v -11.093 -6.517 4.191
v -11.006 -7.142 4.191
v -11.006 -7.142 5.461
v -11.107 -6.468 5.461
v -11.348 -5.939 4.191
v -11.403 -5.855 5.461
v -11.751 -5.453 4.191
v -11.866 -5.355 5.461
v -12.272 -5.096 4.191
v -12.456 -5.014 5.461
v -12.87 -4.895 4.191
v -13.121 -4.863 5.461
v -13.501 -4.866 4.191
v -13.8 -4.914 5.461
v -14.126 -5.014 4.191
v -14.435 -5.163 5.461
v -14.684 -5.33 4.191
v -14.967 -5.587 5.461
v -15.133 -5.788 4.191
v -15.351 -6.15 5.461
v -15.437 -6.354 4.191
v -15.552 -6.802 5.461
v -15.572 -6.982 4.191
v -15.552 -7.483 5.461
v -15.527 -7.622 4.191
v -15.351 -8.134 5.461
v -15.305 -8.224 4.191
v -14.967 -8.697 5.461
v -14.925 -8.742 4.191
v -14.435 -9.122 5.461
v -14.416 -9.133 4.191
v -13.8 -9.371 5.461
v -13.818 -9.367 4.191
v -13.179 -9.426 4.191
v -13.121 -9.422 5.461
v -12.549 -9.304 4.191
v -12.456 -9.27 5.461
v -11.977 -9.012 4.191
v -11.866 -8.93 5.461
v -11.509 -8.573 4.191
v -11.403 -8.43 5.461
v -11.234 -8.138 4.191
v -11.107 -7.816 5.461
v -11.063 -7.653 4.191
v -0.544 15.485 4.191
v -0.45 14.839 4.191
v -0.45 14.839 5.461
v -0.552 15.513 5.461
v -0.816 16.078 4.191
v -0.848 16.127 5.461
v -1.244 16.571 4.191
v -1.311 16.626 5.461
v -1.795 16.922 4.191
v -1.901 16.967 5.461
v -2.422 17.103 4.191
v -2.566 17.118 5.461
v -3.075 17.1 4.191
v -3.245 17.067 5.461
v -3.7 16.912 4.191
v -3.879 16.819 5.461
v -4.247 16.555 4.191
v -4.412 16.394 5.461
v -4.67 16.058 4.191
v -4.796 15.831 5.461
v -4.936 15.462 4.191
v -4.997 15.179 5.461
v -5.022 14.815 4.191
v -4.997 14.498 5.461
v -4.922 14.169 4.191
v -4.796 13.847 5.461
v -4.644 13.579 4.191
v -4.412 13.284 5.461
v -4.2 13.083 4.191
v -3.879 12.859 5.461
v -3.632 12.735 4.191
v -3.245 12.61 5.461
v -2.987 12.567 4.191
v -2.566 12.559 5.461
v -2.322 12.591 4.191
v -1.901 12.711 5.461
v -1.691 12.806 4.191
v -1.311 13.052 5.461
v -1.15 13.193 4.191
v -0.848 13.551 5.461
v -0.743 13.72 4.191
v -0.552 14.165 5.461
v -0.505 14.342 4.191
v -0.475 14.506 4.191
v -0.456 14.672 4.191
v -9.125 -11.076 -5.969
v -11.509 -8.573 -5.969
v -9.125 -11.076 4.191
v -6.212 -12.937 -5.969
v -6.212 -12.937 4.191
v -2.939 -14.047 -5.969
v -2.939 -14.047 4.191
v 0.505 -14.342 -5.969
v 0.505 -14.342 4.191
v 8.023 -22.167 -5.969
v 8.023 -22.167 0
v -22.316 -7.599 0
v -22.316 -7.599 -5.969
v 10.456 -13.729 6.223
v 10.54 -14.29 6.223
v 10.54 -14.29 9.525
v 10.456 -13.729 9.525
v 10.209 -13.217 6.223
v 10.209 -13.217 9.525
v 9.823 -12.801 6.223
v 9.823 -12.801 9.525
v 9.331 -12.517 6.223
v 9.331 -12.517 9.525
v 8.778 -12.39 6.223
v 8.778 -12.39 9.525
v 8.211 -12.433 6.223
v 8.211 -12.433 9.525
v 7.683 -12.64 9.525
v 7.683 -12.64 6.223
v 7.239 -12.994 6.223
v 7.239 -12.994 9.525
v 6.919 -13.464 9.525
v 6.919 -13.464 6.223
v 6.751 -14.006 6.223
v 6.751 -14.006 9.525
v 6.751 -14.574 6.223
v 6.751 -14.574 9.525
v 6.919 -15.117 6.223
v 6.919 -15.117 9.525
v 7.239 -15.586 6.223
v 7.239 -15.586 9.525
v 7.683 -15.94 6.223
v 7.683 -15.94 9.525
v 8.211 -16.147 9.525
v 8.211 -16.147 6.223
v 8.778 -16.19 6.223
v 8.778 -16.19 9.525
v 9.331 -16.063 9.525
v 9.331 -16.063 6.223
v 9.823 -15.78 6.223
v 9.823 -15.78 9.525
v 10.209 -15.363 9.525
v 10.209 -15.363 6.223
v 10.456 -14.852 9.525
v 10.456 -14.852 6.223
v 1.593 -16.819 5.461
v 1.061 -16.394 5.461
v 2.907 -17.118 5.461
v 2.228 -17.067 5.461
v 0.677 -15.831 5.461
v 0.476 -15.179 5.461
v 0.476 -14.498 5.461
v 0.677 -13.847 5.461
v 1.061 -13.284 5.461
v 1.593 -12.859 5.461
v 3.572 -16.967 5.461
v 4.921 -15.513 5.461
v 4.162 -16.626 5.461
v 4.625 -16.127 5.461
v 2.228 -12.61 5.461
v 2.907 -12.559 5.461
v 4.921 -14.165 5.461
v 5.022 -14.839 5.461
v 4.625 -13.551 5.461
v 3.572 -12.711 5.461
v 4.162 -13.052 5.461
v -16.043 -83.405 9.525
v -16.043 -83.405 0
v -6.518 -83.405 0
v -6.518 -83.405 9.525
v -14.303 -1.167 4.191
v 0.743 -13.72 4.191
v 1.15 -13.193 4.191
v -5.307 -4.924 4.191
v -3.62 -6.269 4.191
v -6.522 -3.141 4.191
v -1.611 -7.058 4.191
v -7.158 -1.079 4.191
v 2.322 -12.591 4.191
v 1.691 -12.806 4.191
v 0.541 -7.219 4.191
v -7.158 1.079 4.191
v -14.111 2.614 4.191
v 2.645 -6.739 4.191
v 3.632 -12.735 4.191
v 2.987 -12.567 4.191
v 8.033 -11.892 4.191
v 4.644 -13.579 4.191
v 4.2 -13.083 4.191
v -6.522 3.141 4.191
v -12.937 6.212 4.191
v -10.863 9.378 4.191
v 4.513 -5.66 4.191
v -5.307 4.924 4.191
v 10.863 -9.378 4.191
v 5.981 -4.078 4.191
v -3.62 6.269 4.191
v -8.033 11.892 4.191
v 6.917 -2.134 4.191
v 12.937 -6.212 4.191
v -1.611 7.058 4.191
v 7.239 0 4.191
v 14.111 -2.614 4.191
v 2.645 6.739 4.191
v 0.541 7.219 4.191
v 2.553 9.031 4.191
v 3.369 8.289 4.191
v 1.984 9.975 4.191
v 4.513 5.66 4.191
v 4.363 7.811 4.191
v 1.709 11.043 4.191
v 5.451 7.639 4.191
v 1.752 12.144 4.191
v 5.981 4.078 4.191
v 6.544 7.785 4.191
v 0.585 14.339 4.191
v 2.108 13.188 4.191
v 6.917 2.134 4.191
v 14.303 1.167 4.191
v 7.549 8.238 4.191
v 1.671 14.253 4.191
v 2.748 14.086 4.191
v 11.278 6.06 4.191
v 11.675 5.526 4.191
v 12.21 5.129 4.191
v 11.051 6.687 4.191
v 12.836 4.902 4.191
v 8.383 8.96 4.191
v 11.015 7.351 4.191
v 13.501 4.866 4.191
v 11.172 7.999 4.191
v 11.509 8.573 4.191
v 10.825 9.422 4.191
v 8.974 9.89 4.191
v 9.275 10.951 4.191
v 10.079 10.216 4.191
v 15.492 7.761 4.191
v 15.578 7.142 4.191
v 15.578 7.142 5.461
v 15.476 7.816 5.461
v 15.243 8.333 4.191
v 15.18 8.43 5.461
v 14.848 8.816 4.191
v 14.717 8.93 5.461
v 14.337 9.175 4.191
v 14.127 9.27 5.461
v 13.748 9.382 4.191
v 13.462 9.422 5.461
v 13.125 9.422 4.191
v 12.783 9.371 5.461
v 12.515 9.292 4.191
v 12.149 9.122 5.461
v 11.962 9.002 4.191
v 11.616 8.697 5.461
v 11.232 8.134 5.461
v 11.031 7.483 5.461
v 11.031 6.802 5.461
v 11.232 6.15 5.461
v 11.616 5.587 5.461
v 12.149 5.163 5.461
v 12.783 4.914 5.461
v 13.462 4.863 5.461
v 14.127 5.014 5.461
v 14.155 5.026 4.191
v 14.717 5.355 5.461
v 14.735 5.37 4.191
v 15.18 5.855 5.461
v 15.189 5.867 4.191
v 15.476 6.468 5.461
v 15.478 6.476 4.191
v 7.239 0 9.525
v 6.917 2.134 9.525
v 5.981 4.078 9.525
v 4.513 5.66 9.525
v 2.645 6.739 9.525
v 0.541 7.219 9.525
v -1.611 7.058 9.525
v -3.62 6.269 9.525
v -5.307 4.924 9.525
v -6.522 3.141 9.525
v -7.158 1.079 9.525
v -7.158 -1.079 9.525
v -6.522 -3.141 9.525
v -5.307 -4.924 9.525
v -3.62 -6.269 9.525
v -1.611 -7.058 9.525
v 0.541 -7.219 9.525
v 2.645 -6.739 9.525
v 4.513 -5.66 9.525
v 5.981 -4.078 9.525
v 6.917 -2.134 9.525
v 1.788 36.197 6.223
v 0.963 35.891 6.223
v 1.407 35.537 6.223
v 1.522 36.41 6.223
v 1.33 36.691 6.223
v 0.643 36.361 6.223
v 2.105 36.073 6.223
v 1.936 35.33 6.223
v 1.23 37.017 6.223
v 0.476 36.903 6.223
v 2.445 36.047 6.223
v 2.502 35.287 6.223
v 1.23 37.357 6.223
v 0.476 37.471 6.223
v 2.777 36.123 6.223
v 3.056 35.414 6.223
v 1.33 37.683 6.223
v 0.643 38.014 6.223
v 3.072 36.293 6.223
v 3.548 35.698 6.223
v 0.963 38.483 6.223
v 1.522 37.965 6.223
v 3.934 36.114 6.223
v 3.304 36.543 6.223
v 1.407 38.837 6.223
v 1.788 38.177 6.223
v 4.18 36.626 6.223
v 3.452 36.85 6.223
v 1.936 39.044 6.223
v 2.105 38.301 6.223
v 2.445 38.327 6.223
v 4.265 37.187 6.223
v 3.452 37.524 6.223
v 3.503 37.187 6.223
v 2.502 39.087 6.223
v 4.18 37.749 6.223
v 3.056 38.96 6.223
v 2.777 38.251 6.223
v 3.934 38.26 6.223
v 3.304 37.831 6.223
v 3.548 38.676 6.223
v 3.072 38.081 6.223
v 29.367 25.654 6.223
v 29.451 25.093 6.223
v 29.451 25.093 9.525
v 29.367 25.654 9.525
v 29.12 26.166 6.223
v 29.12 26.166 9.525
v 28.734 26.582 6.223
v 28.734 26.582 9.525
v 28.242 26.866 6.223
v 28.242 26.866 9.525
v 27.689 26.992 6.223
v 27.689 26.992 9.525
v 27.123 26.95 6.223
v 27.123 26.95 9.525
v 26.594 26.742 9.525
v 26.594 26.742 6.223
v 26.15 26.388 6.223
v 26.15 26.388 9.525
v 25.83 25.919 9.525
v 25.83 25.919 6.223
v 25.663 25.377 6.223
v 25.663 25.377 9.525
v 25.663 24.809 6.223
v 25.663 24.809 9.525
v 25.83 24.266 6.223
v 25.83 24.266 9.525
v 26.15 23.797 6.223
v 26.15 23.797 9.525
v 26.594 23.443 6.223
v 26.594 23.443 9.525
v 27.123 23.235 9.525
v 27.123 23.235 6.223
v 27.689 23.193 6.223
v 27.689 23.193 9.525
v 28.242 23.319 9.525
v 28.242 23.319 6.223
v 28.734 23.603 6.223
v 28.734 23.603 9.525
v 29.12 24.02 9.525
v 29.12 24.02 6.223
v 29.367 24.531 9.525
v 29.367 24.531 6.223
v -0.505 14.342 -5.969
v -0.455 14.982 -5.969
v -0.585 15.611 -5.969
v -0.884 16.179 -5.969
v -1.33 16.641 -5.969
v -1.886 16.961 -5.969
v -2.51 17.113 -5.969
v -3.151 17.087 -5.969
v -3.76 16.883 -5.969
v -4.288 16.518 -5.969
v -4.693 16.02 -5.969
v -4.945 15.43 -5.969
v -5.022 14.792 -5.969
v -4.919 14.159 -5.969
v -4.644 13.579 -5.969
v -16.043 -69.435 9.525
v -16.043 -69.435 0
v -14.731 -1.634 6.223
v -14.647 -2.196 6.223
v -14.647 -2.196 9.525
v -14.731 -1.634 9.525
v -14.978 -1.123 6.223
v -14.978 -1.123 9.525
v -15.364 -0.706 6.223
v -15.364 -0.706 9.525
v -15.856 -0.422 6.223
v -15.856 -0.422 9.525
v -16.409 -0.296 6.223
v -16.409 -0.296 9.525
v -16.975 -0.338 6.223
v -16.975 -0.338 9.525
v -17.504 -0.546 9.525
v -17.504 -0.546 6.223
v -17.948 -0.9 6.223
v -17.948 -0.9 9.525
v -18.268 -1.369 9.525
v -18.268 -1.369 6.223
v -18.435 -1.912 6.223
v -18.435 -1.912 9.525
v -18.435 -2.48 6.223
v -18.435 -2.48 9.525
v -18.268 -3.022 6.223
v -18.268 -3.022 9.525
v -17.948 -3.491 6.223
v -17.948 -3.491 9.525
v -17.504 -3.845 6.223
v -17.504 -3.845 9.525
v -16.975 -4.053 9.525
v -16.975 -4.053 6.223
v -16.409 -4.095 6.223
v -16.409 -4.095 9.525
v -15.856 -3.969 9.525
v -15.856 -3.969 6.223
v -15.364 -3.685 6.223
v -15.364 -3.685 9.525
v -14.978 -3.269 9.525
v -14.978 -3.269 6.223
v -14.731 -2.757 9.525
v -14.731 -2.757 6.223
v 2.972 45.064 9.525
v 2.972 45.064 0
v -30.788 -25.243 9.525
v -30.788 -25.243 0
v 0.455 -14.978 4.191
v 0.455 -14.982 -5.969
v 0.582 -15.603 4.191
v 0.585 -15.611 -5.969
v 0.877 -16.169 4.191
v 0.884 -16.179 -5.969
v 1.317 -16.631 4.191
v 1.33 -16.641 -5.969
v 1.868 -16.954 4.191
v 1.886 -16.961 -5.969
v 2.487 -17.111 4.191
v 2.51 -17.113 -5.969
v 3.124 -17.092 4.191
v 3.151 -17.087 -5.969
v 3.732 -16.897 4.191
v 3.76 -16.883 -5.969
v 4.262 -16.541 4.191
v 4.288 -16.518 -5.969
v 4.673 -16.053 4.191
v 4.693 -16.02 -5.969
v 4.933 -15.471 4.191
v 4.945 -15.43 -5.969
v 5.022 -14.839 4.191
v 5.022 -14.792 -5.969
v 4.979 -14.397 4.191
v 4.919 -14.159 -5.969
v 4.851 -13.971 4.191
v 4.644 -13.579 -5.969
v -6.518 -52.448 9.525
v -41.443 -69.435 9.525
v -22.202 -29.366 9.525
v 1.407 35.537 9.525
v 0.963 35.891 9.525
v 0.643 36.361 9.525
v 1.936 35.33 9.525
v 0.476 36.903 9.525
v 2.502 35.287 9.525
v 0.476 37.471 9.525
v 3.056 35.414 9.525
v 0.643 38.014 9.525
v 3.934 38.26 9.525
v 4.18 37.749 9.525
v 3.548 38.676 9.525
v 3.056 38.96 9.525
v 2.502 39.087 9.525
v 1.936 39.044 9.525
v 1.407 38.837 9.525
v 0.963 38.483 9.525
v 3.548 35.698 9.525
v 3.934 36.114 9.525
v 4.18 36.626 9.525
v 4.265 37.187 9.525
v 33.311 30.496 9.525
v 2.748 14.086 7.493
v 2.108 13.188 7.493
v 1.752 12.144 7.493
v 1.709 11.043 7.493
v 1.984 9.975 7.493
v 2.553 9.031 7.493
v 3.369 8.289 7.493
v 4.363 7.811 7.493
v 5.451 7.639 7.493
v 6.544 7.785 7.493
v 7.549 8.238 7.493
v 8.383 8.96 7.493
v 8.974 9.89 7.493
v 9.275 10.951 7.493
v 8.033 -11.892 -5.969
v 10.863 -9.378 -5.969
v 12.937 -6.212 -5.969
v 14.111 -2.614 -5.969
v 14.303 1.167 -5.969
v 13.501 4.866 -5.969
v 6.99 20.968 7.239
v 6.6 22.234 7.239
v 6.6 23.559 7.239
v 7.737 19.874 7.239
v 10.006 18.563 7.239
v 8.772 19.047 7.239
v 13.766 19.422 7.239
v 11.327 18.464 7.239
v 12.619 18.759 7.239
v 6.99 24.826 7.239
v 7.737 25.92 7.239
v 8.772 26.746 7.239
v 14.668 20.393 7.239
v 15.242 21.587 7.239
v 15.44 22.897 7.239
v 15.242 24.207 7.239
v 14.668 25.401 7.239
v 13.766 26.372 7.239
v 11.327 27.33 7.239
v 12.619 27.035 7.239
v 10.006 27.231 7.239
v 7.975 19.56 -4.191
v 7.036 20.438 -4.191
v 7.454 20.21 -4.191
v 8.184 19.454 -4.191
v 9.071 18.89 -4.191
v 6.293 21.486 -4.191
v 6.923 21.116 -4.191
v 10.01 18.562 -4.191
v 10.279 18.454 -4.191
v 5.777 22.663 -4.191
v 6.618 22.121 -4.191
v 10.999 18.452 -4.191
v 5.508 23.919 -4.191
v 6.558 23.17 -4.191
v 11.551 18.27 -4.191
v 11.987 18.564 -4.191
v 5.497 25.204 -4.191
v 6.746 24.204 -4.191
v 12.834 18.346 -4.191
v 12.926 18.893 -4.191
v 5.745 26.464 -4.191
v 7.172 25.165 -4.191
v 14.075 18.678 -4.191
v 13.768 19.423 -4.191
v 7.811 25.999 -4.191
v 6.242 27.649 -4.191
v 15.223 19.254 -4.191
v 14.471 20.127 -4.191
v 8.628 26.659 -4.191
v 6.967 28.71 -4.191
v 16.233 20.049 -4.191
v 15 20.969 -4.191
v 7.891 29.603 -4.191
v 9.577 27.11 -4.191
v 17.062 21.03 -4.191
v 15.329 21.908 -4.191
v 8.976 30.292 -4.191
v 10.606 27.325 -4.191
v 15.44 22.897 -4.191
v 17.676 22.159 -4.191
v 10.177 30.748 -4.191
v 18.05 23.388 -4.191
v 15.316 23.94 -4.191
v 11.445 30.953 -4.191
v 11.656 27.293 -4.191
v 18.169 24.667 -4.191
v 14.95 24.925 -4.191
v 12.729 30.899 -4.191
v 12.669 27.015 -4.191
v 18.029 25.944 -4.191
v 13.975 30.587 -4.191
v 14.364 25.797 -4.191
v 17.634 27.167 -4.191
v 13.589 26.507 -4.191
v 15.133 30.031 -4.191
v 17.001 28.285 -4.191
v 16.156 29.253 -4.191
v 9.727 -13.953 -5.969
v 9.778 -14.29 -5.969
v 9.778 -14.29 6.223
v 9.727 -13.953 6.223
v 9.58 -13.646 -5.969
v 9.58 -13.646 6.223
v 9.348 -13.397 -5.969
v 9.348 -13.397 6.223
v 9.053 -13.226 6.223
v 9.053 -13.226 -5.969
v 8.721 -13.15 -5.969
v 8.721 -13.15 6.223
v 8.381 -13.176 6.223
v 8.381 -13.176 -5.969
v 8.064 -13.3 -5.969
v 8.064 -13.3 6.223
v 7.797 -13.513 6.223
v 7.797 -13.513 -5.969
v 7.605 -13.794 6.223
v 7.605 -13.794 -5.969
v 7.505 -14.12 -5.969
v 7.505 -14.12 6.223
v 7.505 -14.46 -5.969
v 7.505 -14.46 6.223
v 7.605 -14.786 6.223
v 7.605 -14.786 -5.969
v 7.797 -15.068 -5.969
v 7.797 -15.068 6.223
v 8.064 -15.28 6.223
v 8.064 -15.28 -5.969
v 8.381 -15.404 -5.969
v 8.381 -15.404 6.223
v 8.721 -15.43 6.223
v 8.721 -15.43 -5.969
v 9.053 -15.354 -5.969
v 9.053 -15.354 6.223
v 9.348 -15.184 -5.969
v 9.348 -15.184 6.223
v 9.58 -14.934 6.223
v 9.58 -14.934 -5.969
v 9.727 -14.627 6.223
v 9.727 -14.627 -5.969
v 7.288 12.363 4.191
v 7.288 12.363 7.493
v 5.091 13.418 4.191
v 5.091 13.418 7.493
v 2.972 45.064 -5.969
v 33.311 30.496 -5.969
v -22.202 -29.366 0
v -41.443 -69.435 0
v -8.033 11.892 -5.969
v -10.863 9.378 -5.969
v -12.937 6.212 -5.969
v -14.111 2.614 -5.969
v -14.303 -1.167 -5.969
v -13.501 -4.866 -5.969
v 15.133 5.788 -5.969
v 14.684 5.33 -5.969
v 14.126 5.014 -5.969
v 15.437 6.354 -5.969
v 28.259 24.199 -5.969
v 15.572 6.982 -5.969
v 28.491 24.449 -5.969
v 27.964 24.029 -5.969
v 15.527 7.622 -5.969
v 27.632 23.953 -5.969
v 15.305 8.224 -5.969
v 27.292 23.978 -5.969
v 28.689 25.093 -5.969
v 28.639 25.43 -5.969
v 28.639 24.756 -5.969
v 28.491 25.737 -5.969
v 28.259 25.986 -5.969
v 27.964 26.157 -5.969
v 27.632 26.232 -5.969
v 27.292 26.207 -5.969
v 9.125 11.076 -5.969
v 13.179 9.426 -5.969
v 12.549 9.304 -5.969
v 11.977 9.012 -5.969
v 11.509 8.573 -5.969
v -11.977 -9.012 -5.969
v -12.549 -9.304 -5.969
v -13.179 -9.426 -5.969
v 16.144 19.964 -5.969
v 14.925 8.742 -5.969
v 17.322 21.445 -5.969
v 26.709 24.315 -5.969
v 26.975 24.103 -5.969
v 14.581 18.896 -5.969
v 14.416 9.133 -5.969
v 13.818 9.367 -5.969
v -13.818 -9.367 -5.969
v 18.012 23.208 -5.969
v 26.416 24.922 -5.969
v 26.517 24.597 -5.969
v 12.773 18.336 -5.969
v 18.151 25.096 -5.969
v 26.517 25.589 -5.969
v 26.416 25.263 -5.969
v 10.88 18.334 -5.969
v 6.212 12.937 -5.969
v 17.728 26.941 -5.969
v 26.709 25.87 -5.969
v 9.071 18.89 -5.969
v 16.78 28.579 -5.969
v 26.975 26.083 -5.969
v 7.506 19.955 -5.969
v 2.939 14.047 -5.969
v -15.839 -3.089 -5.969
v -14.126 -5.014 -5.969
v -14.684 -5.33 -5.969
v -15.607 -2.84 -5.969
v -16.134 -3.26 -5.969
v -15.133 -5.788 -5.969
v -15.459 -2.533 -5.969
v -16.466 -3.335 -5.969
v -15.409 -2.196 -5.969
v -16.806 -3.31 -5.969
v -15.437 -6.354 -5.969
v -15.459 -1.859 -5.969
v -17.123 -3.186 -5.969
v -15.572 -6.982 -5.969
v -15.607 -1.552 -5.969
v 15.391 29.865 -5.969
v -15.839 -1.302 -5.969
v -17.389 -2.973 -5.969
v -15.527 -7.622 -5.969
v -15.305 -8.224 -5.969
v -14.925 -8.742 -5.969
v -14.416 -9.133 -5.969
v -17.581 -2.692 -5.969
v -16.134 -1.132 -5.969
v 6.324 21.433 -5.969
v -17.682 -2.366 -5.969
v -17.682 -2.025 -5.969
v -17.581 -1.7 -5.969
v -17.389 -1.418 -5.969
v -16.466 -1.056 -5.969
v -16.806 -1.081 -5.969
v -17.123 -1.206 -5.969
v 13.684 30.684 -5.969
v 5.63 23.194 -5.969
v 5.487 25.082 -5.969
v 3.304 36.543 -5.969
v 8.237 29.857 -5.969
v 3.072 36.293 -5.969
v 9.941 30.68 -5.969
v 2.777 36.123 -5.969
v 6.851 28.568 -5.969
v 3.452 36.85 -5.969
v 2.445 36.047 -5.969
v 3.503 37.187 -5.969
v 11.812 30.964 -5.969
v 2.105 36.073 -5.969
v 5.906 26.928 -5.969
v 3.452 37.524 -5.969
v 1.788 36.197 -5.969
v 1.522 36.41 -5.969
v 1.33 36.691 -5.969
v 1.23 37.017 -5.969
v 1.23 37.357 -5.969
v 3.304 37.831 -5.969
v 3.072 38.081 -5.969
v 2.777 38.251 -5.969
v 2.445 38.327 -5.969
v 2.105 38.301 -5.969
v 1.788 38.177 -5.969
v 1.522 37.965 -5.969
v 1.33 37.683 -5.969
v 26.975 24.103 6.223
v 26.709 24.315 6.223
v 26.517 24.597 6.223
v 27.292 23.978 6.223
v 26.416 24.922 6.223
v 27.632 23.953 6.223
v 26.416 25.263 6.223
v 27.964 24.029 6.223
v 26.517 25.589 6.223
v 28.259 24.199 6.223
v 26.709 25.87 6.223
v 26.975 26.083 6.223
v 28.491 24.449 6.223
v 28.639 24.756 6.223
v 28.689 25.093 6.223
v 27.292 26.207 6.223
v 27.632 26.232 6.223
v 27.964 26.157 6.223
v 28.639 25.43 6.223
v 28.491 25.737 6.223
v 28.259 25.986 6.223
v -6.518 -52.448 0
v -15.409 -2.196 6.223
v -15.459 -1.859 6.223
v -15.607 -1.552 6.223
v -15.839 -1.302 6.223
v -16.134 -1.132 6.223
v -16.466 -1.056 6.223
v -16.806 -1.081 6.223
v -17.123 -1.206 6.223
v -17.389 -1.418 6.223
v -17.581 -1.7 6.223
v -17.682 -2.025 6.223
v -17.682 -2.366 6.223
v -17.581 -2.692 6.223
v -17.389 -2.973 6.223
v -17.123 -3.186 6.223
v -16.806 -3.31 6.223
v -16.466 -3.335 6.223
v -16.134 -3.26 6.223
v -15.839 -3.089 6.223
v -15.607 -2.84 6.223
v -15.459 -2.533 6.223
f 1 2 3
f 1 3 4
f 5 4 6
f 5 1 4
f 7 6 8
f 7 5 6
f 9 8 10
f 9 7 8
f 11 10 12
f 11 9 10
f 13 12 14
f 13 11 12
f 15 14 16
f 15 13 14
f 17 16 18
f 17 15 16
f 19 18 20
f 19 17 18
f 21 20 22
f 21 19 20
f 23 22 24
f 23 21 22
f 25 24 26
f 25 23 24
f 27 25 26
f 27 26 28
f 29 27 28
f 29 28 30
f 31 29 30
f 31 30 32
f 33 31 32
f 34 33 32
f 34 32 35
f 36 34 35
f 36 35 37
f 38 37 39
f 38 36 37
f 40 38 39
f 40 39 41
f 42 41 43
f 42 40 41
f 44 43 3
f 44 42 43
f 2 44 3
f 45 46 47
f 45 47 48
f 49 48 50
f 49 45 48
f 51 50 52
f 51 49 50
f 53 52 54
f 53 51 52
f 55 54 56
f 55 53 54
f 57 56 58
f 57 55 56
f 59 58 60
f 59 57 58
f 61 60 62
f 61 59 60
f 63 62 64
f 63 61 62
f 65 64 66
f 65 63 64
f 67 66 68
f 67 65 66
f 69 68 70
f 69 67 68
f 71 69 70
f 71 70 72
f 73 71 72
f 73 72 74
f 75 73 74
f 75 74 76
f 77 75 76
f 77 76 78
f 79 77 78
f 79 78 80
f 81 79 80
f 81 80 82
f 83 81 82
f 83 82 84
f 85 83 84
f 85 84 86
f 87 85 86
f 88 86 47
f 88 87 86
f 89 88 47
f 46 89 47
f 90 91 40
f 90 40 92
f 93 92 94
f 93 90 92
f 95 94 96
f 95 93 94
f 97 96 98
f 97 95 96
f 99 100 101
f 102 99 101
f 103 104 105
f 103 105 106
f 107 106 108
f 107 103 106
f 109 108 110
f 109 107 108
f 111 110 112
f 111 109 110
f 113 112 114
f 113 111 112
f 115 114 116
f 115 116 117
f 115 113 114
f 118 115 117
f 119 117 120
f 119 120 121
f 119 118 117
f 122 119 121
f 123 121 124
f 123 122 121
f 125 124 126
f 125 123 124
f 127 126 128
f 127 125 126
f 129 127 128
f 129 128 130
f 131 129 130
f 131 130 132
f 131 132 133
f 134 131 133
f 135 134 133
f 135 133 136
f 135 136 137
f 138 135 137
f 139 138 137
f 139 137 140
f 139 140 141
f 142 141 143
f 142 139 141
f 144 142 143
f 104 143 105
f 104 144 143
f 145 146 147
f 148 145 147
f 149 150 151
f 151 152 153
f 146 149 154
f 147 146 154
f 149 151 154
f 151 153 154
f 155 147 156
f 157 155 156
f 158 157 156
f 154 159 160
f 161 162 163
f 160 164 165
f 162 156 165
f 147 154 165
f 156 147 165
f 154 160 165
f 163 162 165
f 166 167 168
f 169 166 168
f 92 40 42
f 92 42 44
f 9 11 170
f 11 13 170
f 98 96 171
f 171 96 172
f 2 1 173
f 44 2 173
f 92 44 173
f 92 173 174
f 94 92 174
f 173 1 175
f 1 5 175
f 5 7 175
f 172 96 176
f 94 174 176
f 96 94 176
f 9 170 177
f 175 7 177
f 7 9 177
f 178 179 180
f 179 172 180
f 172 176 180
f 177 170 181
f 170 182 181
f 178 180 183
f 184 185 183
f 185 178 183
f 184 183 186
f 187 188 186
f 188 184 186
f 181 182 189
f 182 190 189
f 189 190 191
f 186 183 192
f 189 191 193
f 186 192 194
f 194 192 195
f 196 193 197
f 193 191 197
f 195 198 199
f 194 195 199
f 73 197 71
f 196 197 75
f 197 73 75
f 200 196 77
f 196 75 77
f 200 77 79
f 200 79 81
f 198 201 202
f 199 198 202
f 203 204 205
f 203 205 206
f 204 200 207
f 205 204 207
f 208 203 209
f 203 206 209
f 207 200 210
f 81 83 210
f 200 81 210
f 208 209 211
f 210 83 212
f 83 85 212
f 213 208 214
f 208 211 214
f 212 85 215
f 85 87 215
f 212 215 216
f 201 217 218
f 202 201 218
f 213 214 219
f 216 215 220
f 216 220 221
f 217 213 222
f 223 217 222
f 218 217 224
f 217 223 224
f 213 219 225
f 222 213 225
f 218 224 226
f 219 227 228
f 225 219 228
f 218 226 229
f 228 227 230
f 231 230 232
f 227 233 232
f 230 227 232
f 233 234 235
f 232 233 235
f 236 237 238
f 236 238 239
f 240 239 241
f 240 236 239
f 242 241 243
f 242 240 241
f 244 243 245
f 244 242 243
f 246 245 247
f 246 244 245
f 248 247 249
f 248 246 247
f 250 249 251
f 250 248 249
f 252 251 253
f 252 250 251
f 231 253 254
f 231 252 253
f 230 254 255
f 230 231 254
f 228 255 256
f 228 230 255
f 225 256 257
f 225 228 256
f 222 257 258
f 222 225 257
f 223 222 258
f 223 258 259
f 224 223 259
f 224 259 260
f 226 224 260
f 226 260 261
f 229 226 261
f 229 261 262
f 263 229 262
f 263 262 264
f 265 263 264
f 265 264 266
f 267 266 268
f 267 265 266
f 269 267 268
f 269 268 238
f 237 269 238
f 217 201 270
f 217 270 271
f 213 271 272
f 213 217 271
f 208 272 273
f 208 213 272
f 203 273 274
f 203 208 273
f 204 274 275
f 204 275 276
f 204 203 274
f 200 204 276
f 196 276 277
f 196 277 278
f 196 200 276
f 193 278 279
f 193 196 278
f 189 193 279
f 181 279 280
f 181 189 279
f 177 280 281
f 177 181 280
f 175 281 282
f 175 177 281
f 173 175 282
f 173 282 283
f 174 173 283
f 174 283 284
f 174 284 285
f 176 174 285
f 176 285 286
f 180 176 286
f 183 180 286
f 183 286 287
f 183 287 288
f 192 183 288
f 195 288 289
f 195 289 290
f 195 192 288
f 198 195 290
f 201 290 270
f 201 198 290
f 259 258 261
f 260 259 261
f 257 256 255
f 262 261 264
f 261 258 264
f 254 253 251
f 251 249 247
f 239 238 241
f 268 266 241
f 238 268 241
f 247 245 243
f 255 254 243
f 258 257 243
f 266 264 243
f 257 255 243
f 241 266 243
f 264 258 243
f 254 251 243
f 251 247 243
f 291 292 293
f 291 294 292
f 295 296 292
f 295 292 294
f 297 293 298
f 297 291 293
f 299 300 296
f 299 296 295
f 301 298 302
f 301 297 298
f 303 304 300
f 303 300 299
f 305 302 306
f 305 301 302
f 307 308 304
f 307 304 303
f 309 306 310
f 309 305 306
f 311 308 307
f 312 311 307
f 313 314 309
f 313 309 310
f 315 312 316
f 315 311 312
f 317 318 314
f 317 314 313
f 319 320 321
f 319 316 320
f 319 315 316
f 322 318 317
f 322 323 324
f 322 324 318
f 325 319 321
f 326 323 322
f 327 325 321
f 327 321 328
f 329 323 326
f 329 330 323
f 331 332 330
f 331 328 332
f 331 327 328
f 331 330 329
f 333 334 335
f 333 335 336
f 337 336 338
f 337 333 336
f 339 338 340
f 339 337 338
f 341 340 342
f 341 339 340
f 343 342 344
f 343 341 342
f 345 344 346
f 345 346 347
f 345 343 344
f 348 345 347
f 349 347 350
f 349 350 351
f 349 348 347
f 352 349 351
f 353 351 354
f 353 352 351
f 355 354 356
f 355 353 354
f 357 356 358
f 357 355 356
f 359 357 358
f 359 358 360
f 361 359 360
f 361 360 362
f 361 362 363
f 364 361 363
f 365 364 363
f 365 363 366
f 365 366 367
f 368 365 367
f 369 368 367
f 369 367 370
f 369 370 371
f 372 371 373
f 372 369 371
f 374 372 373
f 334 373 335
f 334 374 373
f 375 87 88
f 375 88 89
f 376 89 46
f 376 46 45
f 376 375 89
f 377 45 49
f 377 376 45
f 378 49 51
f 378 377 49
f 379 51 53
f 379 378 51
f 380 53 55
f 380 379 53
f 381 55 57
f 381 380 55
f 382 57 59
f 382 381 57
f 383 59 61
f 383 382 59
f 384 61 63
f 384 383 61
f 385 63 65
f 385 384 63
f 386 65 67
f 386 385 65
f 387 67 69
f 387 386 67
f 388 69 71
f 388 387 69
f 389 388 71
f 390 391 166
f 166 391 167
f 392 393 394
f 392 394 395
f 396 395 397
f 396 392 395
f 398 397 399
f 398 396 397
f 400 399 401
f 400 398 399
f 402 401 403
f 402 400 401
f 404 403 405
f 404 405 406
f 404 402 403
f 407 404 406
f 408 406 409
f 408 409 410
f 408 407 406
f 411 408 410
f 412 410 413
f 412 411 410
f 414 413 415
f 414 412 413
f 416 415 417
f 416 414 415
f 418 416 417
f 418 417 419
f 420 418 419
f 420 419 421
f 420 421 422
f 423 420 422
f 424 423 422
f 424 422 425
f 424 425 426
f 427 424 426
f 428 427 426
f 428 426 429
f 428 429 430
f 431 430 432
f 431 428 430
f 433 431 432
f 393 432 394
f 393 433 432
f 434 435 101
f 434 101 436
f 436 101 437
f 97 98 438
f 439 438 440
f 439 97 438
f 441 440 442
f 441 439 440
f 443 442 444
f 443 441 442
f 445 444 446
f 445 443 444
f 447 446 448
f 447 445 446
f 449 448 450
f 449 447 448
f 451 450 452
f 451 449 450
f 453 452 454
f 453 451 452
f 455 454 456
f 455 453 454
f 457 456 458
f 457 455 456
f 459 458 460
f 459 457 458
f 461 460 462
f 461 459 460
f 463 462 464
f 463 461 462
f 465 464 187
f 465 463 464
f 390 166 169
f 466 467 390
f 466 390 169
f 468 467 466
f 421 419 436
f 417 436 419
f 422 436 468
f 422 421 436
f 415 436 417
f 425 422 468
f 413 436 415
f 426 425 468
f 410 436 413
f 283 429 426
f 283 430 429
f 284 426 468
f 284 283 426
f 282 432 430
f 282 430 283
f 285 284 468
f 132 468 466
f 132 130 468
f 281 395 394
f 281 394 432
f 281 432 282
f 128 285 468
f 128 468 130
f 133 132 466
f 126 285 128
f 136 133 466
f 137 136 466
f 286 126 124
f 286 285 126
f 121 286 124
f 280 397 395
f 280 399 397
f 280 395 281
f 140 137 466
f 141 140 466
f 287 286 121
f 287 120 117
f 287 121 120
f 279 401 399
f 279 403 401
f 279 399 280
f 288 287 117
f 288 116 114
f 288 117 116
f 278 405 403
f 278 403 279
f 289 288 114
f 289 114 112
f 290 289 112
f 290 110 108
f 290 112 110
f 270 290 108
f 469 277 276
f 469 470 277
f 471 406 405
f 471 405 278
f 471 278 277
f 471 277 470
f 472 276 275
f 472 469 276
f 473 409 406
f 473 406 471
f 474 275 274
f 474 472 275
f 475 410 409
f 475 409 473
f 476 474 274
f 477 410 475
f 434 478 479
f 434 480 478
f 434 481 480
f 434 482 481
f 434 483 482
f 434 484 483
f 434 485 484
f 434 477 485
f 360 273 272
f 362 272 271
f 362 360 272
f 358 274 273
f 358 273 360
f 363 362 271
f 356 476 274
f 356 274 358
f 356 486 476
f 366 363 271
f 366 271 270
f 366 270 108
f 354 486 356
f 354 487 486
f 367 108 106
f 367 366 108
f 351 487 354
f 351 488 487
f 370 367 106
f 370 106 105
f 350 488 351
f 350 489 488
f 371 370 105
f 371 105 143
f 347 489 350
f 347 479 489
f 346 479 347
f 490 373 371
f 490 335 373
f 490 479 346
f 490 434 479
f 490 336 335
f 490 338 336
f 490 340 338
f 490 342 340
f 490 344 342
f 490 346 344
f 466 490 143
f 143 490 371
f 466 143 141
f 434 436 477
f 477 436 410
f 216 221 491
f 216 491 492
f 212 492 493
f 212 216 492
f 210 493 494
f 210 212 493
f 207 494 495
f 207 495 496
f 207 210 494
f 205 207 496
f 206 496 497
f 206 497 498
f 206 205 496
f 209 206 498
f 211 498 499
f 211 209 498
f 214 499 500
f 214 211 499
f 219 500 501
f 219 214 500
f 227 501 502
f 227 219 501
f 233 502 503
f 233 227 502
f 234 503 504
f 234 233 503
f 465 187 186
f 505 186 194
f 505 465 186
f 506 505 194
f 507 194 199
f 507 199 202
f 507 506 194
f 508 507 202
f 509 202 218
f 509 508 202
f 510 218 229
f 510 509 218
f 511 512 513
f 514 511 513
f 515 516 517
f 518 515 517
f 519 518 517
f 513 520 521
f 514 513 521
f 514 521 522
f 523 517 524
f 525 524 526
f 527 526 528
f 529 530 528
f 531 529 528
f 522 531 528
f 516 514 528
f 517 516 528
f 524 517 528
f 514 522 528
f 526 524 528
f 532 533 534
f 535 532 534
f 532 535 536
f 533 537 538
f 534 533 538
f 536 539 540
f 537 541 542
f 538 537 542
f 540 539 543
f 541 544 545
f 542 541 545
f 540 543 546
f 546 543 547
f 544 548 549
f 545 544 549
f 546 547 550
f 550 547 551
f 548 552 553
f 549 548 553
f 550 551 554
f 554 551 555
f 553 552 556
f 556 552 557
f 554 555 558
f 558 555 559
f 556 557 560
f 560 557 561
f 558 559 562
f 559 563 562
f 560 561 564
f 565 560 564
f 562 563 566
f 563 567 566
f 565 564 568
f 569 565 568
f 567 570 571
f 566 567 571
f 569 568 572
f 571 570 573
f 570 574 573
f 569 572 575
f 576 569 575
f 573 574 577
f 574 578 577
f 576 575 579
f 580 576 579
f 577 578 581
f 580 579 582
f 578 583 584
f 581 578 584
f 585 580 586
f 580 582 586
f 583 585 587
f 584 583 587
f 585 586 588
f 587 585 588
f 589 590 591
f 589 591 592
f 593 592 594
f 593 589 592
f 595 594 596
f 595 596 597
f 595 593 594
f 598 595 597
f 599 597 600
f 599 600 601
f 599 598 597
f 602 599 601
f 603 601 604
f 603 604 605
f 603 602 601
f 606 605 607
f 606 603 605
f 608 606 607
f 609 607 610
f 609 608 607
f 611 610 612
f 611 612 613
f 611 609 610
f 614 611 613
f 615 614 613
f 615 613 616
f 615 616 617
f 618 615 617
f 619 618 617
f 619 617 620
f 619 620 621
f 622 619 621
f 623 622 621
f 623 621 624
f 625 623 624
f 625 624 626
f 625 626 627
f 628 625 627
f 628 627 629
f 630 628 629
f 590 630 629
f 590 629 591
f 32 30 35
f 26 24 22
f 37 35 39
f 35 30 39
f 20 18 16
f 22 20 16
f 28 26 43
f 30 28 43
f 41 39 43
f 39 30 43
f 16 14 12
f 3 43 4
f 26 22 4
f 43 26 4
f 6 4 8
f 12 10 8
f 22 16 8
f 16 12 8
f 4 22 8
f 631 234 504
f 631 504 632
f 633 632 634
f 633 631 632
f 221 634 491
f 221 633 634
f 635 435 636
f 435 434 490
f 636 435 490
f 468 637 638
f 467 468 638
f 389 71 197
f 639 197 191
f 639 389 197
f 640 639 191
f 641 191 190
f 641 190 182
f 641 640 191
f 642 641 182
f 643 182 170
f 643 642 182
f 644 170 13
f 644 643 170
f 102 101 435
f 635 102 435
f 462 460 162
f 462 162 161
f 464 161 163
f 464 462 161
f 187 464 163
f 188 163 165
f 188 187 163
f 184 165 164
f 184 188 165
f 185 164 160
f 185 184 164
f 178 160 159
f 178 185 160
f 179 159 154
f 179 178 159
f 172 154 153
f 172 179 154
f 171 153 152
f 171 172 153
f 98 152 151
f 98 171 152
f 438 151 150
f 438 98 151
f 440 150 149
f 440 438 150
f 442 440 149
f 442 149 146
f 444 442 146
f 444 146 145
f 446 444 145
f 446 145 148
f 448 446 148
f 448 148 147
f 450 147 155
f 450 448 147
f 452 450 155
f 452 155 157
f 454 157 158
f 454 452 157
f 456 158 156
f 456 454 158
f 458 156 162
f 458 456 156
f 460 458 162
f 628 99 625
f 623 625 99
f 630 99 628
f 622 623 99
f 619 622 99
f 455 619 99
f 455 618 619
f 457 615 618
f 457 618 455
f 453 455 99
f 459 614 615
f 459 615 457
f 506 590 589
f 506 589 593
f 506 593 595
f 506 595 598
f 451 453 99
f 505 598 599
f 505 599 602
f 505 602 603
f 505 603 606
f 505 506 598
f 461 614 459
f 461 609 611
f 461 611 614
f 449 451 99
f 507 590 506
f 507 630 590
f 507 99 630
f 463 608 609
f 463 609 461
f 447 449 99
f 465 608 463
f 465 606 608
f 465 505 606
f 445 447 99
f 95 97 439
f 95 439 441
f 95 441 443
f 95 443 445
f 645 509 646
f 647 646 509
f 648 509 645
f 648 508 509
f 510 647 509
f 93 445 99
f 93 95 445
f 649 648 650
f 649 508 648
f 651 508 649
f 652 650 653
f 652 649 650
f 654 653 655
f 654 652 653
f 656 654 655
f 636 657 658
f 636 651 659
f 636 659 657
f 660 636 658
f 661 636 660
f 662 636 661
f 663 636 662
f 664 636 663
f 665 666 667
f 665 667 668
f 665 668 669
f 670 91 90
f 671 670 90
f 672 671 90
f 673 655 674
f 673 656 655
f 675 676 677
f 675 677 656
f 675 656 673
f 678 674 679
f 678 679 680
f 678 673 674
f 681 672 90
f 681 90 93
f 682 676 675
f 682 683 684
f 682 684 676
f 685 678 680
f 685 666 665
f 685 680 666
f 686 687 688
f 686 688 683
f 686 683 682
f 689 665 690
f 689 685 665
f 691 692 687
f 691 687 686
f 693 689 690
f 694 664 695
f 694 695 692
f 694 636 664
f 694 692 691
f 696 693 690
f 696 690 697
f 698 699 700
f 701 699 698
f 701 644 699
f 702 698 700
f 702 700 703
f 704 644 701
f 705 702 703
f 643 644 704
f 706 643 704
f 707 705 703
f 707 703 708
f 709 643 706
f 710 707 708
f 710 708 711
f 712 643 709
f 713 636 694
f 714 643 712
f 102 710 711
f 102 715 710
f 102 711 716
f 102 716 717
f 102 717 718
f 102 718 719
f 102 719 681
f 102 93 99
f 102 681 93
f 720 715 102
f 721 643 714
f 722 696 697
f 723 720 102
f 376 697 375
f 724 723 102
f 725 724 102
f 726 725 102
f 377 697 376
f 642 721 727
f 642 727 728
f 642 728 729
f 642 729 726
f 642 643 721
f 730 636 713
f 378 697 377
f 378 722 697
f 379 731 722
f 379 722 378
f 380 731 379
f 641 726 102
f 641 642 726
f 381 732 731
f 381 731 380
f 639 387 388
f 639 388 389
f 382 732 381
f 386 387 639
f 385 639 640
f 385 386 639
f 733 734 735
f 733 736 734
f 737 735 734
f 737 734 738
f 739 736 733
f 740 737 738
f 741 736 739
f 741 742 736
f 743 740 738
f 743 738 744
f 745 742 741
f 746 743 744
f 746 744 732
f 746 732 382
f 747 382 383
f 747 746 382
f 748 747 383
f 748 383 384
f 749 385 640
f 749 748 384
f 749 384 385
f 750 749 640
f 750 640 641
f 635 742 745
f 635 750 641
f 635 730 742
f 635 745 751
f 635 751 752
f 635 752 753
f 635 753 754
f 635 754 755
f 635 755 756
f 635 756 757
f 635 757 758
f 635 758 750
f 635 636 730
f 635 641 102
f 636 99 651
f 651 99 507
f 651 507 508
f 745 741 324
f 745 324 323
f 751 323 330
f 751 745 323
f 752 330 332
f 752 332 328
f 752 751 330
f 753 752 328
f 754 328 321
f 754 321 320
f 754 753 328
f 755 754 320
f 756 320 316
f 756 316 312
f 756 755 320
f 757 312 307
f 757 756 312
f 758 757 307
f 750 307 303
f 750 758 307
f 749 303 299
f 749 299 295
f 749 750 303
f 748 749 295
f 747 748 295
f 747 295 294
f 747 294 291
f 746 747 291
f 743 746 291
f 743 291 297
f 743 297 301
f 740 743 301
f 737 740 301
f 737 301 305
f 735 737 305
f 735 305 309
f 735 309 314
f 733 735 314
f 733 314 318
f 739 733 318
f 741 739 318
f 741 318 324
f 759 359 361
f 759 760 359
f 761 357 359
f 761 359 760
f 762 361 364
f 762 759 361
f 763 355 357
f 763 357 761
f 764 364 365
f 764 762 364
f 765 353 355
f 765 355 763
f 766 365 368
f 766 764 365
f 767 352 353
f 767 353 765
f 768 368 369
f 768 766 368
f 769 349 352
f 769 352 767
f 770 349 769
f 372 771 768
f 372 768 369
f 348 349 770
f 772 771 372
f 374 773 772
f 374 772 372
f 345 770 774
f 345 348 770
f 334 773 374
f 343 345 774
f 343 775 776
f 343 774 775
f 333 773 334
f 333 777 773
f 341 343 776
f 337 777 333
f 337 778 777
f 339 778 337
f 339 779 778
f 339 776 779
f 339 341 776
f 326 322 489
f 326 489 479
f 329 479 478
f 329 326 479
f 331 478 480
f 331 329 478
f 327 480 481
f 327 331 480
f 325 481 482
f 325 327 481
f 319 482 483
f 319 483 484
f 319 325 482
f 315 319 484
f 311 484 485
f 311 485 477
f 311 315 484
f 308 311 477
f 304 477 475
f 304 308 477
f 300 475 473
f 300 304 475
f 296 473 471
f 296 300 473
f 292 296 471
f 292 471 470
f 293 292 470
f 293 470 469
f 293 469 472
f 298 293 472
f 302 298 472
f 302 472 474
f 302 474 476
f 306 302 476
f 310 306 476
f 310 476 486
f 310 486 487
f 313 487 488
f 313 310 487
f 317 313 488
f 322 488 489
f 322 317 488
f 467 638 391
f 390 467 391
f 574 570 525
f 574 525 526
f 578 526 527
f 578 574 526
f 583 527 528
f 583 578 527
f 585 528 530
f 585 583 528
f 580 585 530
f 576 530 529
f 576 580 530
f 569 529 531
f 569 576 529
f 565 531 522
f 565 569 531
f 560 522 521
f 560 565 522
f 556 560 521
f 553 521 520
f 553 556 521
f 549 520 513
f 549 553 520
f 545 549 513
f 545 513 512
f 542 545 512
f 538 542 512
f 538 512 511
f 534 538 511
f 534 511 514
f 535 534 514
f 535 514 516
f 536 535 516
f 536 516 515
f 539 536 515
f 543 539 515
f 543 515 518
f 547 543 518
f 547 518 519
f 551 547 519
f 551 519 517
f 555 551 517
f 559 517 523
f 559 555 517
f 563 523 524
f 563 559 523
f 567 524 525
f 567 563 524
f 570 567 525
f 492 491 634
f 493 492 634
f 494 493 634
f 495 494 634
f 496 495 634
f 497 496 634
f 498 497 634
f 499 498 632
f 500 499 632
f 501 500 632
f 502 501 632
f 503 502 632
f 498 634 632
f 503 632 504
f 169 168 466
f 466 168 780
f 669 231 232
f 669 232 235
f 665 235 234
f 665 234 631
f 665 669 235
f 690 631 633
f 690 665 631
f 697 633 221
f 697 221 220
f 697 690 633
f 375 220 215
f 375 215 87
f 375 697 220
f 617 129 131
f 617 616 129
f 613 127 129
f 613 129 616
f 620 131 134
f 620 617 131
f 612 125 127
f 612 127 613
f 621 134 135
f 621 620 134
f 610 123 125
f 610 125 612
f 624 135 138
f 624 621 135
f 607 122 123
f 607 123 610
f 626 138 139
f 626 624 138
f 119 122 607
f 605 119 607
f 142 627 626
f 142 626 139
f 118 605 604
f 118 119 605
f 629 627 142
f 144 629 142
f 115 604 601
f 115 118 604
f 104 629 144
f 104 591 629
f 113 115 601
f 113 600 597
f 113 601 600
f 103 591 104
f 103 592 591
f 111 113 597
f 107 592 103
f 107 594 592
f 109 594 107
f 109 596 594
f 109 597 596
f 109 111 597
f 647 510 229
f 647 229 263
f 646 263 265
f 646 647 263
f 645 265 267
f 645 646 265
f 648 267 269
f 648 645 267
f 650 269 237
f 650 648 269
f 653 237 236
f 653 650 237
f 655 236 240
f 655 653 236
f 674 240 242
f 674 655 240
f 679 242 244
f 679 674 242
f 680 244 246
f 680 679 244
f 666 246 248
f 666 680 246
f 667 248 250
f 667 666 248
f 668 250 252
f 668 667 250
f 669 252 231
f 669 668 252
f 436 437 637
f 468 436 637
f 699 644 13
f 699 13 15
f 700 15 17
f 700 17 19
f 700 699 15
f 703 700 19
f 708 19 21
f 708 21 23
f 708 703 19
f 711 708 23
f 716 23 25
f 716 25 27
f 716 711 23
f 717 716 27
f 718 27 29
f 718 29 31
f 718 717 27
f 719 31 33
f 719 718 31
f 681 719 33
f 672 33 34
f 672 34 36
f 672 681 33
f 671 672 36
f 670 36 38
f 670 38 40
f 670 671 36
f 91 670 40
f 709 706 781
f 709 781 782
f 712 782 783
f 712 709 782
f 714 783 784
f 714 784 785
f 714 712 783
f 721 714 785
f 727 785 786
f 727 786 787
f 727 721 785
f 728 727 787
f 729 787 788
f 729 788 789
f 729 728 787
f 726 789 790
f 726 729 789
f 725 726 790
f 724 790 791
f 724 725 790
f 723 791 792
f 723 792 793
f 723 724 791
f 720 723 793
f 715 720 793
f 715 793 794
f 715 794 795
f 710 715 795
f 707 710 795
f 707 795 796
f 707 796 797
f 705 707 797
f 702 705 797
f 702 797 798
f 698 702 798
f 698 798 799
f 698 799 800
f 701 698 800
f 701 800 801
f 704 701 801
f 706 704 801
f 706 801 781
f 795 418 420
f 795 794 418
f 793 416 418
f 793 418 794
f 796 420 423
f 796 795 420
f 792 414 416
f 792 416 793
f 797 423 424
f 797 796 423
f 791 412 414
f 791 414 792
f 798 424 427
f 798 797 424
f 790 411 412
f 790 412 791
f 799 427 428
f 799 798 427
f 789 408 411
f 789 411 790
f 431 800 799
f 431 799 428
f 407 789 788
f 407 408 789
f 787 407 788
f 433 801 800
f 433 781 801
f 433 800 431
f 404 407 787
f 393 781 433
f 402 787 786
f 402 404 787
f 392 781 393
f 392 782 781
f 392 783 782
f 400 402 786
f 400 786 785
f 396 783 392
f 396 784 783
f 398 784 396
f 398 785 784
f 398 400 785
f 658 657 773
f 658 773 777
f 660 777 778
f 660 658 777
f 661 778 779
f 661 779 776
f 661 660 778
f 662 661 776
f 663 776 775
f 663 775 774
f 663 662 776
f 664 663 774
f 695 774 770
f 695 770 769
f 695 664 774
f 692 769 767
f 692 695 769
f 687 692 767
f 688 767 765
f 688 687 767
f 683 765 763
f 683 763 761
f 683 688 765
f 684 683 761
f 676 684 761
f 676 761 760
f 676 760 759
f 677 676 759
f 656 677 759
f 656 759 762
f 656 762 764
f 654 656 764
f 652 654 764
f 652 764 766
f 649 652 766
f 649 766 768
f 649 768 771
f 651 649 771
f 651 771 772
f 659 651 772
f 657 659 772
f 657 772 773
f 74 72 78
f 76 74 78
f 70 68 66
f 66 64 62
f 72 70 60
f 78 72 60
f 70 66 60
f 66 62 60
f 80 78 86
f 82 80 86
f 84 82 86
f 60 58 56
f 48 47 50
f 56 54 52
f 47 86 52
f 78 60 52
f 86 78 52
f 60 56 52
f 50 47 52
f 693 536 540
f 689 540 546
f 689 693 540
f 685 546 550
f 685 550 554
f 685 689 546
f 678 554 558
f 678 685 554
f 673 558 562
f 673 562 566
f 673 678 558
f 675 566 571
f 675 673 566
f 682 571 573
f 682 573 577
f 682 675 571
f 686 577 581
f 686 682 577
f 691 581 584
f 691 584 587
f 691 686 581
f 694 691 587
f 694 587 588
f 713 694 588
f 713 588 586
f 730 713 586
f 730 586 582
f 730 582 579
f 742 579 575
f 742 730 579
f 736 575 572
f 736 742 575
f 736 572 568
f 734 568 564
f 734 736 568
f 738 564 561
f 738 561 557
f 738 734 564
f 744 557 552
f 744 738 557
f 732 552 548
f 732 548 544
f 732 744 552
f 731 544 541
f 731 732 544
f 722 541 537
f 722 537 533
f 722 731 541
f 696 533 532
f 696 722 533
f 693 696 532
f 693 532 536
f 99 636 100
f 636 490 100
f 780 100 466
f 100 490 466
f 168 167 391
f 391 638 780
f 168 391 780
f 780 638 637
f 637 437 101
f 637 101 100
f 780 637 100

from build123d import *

# Parameters (mm, degrees)
BOSS_EXTRUDE1_DEPTH   = 9.525
BOSS_EXTRUDE2_DEPTH   = 5.969
CAVITY1_START         = -5.969
CAVITY1_OUTLINE_R     = 4.445
CAVITY1_OUTLINE_R_2   = 1.143
CAVITY1_DEPTH         = 10.16
CAVITY1_START_2       = 4.191
CAVITY1_2_OUTLINE_R   = 7.239
CAVITY1_2_OUTLINE_R_2 = 1.143
CAVITY1_2_DEPTH       = 5.334
CAVITY1_3_OUTLINE_R   = 4.445
CAVITY1_3_DEPTH       = 3.048
CAVITY1_4_OUTLINE_R   = 6.35
CAVITY1_4_OUTLINE_R_2 = 4.445
CAVITY1_4_DEPTH       = 1.778
CAVITY1_START_3       = 6.223
CAVITY1_5_OUTLINE_R   = 1.905
CAVITY1_5_OUTLINE_R_2 = 1.143
CAVITY1_5_DEPTH       = 3.302
CAVITY1_6_OUTLINE_R   = 2.286
CAVITY1_6_DEPTH       = 1.27
CAVITY1_START_4       = 7.239
CAVITY1_7_DEPTH       = 0.254


# Read off the part's stored shape, not the designer's step: Cavity1
with BuildPart() as part:
    # Sketch1 → Boss-Extrude1 (new body)
    with BuildSketch(Plane.XY):
        Polygon((-41.443198843, -69.435406513), (-16.043198843, -69.435406513), (-16.043198843, -83.405406513), (-6.518198843, -83.405406513), (-6.518198843, -52.448144489), (33.310925875, 30.495820593), (2.972453908, 45.064147324), (-30.788372585, -25.242615218), (-22.202012594, -29.365726557), align=None)
    extrude(amount=BOSS_EXTRUDE1_DEPTH)

    # Sketch2 → Boss-Extrude2 (add)
    with BuildSketch(Plane(origin=(0, 0, 0), x_dir=(-1, 0, 0), z_dir=(0, 0, -1))):
        Polygon((-2.972453908, 45.064147324), (-33.310925875, 30.495820593), (-8.022509662, -22.167187349), (22.315962304, -7.598860618), align=None)
    extrude(amount=BOSS_EXTRUDE2_DEPTH)

    # Cavity1 outline → Cavity1 (cut)
    with BuildSketch(Plane.XY.offset(CAVITY1_START)):
        with BuildLine():
            ThreePointArc((11.508743469, 8.573215544), (6.212154418, 12.936782386), (-0.504959238, 14.342113414))
            ThreePointArc((-0.504959238, 14.342113414), (-3.150914892, 17.086873862), (-4.643828287, 13.578882864))
            ThreePointArc((-4.643828287, 13.578882864), (-12.936782386, 6.212154417), (-13.500892619, -4.86591199))
            ThreePointArc((-13.500892619, -4.86591199), (-15.305202325, -8.224372608), (-11.508743469, -8.573215544))
            ThreePointArc((-11.508743469, -8.573215544), (-6.212154418, -12.936782386), (0.504959238, -14.342113414))
            ThreePointArc((0.504959238, -14.342113414), (3.150914892, -17.086873862), (4.643828287, -13.578882864))
            ThreePointArc((4.643828287, -13.578882864), (12.936782386, -6.212154417), (13.500892619, 4.86591199))
            ThreePointArc((13.500892619, 4.86591199), (15.305202325, 8.224372608), (11.508743469, 8.573215544))
        make_face()
        with Locations((10.994963571, 22.896959975)):
            Circle(CAVITY1_OUTLINE_R)
        with Locations((2.35982247, 37.187095529)):
            Circle(CAVITY1_OUTLINE_R_2)
        with Locations((27.546478442, 25.092635602)):
            Circle(CAVITY1_OUTLINE_R_2)
        with Locations((8.635141101, -14.290135555)):
            Circle(CAVITY1_OUTLINE_R_2)
        with Locations((-16.551514871, -2.195675627)):
            Circle(CAVITY1_OUTLINE_R_2)
    extrude(amount=CAVITY1_DEPTH, mode=Mode.SUBTRACT)

    # Cavity1 2 outline → Cavity1 2 (cut)
    with BuildSketch(Plane.XY.offset(CAVITY1_START_2)):
        Circle(CAVITY1_2_OUTLINE_R)
        with Locations((2.35982247, 37.187095529)):
            Circle(CAVITY1_2_OUTLINE_R_2)
        with Locations((27.546478442, 25.092635602)):
            Circle(CAVITY1_2_OUTLINE_R_2)
        with Locations((8.635141101, -14.290135555)):
            Circle(CAVITY1_2_OUTLINE_R_2)
        with Locations((-16.551514871, -2.195675627)):
            Circle(CAVITY1_2_OUTLINE_R_2)
    extrude(amount=CAVITY1_2_DEPTH, mode=Mode.SUBTRACT)

    # Cavity1 3 outline → Cavity1 3 (cut)
    with BuildSketch(Plane.XY.offset(CAVITY1_START_2)):
        with BuildLine():
            ThreePointArc((2.747559241, 14.085528716), (3.84823725, 8.013935991), (9.274883676, 10.951152168))
            ThreePointArc((9.274883676, 10.951152168), (6.212154418, 12.936782386), (2.747559241, 14.085528716))
        make_face()
        with Locations((10.994963571, 22.896959975)):
            Circle(CAVITY1_3_OUTLINE_R)
    extrude(amount=CAVITY1_3_DEPTH, mode=Mode.SUBTRACT)

    # Cavity1 4 outline → Cavity1 4 (cut)
    with BuildSketch(Plane.XY.offset(CAVITY1_START)):
        with Locations((11.819585838, 24.614231973)):
            Circle(CAVITY1_4_OUTLINE_R)
        with Locations((10.994963571, 22.896959975)):
            Circle(CAVITY1_4_OUTLINE_R_2, mode=Mode.SUBTRACT)
    extrude(amount=CAVITY1_4_DEPTH, mode=Mode.SUBTRACT)

    # Cavity1 5 outline → Cavity1 5 (cut)
    # profile 1 of 4: a face of its own
    with BuildSketch(Plane.XY.offset(CAVITY1_START_3)):
        with Locations((2.35982247, 37.187095529)):
            Circle(CAVITY1_5_OUTLINE_R)
        with Locations((2.35982247, 37.187095529)):
            Circle(CAVITY1_5_OUTLINE_R_2, mode=Mode.SUBTRACT)
    # profile 2 of 4: a face of its own
    with BuildSketch(Plane.XY.offset(CAVITY1_START_3)):
        with Locations((27.546478442, 25.092635602)):
            Circle(CAVITY1_5_OUTLINE_R)
        with Locations((27.546478442, 25.092635602)):
            Circle(CAVITY1_5_OUTLINE_R_2, mode=Mode.SUBTRACT)
    # profile 3 of 4: a face of its own
    with BuildSketch(Plane.XY.offset(CAVITY1_START_3)):
        with Locations((8.635141101, -14.290135555)):
            Circle(CAVITY1_5_OUTLINE_R)
        with Locations((8.635141101, -14.290135555)):
            Circle(CAVITY1_5_OUTLINE_R_2, mode=Mode.SUBTRACT)
    # profile 4 of 4: a face of its own
    with BuildSketch(Plane.XY.offset(CAVITY1_START_3)):
        with Locations((-16.551514871, -2.195675627)):
            Circle(CAVITY1_5_OUTLINE_R)
        with Locations((-16.551514871, -2.195675627)):
            Circle(CAVITY1_5_OUTLINE_R_2, mode=Mode.SUBTRACT)
    extrude(amount=CAVITY1_5_DEPTH, mode=Mode.SUBTRACT)

    # Cavity1 6 outline → Cavity1 6 (cut)
    with BuildSketch(Plane.XY.offset(CAVITY1_START_2)):
        with Locations((13.291518505, 7.142303538)):
            Circle(CAVITY1_6_OUTLINE_R)
        with Locations((-2.736353477, 14.838778038)):
            Circle(CAVITY1_6_OUTLINE_R)
        with Locations((2.736353477, -14.838778038)):
            Circle(CAVITY1_6_OUTLINE_R)
        with Locations((-13.291518505, -7.142303538)):
            Circle(CAVITY1_6_OUTLINE_R)
    extrude(amount=CAVITY1_6_DEPTH, mode=Mode.SUBTRACT)

    # Cavity1 7 outline → Cavity1 7 (cut)
    with BuildSketch(Plane.XY.offset(CAVITY1_START_4)):
        with BuildLine():
            ThreePointArc((2.747559241, 14.085528716), (3.84823725, 8.013935991), (9.274883676, 10.951152168))
            ThreePointArc((9.274883676, 10.951152168), (6.212154418, 12.936782386), (2.747559241, 14.085528716))
        make_face()
    extrude(amount=CAVITY1_7_DEPTH, mode=Mode.SUBTRACT)


solid = part.part
